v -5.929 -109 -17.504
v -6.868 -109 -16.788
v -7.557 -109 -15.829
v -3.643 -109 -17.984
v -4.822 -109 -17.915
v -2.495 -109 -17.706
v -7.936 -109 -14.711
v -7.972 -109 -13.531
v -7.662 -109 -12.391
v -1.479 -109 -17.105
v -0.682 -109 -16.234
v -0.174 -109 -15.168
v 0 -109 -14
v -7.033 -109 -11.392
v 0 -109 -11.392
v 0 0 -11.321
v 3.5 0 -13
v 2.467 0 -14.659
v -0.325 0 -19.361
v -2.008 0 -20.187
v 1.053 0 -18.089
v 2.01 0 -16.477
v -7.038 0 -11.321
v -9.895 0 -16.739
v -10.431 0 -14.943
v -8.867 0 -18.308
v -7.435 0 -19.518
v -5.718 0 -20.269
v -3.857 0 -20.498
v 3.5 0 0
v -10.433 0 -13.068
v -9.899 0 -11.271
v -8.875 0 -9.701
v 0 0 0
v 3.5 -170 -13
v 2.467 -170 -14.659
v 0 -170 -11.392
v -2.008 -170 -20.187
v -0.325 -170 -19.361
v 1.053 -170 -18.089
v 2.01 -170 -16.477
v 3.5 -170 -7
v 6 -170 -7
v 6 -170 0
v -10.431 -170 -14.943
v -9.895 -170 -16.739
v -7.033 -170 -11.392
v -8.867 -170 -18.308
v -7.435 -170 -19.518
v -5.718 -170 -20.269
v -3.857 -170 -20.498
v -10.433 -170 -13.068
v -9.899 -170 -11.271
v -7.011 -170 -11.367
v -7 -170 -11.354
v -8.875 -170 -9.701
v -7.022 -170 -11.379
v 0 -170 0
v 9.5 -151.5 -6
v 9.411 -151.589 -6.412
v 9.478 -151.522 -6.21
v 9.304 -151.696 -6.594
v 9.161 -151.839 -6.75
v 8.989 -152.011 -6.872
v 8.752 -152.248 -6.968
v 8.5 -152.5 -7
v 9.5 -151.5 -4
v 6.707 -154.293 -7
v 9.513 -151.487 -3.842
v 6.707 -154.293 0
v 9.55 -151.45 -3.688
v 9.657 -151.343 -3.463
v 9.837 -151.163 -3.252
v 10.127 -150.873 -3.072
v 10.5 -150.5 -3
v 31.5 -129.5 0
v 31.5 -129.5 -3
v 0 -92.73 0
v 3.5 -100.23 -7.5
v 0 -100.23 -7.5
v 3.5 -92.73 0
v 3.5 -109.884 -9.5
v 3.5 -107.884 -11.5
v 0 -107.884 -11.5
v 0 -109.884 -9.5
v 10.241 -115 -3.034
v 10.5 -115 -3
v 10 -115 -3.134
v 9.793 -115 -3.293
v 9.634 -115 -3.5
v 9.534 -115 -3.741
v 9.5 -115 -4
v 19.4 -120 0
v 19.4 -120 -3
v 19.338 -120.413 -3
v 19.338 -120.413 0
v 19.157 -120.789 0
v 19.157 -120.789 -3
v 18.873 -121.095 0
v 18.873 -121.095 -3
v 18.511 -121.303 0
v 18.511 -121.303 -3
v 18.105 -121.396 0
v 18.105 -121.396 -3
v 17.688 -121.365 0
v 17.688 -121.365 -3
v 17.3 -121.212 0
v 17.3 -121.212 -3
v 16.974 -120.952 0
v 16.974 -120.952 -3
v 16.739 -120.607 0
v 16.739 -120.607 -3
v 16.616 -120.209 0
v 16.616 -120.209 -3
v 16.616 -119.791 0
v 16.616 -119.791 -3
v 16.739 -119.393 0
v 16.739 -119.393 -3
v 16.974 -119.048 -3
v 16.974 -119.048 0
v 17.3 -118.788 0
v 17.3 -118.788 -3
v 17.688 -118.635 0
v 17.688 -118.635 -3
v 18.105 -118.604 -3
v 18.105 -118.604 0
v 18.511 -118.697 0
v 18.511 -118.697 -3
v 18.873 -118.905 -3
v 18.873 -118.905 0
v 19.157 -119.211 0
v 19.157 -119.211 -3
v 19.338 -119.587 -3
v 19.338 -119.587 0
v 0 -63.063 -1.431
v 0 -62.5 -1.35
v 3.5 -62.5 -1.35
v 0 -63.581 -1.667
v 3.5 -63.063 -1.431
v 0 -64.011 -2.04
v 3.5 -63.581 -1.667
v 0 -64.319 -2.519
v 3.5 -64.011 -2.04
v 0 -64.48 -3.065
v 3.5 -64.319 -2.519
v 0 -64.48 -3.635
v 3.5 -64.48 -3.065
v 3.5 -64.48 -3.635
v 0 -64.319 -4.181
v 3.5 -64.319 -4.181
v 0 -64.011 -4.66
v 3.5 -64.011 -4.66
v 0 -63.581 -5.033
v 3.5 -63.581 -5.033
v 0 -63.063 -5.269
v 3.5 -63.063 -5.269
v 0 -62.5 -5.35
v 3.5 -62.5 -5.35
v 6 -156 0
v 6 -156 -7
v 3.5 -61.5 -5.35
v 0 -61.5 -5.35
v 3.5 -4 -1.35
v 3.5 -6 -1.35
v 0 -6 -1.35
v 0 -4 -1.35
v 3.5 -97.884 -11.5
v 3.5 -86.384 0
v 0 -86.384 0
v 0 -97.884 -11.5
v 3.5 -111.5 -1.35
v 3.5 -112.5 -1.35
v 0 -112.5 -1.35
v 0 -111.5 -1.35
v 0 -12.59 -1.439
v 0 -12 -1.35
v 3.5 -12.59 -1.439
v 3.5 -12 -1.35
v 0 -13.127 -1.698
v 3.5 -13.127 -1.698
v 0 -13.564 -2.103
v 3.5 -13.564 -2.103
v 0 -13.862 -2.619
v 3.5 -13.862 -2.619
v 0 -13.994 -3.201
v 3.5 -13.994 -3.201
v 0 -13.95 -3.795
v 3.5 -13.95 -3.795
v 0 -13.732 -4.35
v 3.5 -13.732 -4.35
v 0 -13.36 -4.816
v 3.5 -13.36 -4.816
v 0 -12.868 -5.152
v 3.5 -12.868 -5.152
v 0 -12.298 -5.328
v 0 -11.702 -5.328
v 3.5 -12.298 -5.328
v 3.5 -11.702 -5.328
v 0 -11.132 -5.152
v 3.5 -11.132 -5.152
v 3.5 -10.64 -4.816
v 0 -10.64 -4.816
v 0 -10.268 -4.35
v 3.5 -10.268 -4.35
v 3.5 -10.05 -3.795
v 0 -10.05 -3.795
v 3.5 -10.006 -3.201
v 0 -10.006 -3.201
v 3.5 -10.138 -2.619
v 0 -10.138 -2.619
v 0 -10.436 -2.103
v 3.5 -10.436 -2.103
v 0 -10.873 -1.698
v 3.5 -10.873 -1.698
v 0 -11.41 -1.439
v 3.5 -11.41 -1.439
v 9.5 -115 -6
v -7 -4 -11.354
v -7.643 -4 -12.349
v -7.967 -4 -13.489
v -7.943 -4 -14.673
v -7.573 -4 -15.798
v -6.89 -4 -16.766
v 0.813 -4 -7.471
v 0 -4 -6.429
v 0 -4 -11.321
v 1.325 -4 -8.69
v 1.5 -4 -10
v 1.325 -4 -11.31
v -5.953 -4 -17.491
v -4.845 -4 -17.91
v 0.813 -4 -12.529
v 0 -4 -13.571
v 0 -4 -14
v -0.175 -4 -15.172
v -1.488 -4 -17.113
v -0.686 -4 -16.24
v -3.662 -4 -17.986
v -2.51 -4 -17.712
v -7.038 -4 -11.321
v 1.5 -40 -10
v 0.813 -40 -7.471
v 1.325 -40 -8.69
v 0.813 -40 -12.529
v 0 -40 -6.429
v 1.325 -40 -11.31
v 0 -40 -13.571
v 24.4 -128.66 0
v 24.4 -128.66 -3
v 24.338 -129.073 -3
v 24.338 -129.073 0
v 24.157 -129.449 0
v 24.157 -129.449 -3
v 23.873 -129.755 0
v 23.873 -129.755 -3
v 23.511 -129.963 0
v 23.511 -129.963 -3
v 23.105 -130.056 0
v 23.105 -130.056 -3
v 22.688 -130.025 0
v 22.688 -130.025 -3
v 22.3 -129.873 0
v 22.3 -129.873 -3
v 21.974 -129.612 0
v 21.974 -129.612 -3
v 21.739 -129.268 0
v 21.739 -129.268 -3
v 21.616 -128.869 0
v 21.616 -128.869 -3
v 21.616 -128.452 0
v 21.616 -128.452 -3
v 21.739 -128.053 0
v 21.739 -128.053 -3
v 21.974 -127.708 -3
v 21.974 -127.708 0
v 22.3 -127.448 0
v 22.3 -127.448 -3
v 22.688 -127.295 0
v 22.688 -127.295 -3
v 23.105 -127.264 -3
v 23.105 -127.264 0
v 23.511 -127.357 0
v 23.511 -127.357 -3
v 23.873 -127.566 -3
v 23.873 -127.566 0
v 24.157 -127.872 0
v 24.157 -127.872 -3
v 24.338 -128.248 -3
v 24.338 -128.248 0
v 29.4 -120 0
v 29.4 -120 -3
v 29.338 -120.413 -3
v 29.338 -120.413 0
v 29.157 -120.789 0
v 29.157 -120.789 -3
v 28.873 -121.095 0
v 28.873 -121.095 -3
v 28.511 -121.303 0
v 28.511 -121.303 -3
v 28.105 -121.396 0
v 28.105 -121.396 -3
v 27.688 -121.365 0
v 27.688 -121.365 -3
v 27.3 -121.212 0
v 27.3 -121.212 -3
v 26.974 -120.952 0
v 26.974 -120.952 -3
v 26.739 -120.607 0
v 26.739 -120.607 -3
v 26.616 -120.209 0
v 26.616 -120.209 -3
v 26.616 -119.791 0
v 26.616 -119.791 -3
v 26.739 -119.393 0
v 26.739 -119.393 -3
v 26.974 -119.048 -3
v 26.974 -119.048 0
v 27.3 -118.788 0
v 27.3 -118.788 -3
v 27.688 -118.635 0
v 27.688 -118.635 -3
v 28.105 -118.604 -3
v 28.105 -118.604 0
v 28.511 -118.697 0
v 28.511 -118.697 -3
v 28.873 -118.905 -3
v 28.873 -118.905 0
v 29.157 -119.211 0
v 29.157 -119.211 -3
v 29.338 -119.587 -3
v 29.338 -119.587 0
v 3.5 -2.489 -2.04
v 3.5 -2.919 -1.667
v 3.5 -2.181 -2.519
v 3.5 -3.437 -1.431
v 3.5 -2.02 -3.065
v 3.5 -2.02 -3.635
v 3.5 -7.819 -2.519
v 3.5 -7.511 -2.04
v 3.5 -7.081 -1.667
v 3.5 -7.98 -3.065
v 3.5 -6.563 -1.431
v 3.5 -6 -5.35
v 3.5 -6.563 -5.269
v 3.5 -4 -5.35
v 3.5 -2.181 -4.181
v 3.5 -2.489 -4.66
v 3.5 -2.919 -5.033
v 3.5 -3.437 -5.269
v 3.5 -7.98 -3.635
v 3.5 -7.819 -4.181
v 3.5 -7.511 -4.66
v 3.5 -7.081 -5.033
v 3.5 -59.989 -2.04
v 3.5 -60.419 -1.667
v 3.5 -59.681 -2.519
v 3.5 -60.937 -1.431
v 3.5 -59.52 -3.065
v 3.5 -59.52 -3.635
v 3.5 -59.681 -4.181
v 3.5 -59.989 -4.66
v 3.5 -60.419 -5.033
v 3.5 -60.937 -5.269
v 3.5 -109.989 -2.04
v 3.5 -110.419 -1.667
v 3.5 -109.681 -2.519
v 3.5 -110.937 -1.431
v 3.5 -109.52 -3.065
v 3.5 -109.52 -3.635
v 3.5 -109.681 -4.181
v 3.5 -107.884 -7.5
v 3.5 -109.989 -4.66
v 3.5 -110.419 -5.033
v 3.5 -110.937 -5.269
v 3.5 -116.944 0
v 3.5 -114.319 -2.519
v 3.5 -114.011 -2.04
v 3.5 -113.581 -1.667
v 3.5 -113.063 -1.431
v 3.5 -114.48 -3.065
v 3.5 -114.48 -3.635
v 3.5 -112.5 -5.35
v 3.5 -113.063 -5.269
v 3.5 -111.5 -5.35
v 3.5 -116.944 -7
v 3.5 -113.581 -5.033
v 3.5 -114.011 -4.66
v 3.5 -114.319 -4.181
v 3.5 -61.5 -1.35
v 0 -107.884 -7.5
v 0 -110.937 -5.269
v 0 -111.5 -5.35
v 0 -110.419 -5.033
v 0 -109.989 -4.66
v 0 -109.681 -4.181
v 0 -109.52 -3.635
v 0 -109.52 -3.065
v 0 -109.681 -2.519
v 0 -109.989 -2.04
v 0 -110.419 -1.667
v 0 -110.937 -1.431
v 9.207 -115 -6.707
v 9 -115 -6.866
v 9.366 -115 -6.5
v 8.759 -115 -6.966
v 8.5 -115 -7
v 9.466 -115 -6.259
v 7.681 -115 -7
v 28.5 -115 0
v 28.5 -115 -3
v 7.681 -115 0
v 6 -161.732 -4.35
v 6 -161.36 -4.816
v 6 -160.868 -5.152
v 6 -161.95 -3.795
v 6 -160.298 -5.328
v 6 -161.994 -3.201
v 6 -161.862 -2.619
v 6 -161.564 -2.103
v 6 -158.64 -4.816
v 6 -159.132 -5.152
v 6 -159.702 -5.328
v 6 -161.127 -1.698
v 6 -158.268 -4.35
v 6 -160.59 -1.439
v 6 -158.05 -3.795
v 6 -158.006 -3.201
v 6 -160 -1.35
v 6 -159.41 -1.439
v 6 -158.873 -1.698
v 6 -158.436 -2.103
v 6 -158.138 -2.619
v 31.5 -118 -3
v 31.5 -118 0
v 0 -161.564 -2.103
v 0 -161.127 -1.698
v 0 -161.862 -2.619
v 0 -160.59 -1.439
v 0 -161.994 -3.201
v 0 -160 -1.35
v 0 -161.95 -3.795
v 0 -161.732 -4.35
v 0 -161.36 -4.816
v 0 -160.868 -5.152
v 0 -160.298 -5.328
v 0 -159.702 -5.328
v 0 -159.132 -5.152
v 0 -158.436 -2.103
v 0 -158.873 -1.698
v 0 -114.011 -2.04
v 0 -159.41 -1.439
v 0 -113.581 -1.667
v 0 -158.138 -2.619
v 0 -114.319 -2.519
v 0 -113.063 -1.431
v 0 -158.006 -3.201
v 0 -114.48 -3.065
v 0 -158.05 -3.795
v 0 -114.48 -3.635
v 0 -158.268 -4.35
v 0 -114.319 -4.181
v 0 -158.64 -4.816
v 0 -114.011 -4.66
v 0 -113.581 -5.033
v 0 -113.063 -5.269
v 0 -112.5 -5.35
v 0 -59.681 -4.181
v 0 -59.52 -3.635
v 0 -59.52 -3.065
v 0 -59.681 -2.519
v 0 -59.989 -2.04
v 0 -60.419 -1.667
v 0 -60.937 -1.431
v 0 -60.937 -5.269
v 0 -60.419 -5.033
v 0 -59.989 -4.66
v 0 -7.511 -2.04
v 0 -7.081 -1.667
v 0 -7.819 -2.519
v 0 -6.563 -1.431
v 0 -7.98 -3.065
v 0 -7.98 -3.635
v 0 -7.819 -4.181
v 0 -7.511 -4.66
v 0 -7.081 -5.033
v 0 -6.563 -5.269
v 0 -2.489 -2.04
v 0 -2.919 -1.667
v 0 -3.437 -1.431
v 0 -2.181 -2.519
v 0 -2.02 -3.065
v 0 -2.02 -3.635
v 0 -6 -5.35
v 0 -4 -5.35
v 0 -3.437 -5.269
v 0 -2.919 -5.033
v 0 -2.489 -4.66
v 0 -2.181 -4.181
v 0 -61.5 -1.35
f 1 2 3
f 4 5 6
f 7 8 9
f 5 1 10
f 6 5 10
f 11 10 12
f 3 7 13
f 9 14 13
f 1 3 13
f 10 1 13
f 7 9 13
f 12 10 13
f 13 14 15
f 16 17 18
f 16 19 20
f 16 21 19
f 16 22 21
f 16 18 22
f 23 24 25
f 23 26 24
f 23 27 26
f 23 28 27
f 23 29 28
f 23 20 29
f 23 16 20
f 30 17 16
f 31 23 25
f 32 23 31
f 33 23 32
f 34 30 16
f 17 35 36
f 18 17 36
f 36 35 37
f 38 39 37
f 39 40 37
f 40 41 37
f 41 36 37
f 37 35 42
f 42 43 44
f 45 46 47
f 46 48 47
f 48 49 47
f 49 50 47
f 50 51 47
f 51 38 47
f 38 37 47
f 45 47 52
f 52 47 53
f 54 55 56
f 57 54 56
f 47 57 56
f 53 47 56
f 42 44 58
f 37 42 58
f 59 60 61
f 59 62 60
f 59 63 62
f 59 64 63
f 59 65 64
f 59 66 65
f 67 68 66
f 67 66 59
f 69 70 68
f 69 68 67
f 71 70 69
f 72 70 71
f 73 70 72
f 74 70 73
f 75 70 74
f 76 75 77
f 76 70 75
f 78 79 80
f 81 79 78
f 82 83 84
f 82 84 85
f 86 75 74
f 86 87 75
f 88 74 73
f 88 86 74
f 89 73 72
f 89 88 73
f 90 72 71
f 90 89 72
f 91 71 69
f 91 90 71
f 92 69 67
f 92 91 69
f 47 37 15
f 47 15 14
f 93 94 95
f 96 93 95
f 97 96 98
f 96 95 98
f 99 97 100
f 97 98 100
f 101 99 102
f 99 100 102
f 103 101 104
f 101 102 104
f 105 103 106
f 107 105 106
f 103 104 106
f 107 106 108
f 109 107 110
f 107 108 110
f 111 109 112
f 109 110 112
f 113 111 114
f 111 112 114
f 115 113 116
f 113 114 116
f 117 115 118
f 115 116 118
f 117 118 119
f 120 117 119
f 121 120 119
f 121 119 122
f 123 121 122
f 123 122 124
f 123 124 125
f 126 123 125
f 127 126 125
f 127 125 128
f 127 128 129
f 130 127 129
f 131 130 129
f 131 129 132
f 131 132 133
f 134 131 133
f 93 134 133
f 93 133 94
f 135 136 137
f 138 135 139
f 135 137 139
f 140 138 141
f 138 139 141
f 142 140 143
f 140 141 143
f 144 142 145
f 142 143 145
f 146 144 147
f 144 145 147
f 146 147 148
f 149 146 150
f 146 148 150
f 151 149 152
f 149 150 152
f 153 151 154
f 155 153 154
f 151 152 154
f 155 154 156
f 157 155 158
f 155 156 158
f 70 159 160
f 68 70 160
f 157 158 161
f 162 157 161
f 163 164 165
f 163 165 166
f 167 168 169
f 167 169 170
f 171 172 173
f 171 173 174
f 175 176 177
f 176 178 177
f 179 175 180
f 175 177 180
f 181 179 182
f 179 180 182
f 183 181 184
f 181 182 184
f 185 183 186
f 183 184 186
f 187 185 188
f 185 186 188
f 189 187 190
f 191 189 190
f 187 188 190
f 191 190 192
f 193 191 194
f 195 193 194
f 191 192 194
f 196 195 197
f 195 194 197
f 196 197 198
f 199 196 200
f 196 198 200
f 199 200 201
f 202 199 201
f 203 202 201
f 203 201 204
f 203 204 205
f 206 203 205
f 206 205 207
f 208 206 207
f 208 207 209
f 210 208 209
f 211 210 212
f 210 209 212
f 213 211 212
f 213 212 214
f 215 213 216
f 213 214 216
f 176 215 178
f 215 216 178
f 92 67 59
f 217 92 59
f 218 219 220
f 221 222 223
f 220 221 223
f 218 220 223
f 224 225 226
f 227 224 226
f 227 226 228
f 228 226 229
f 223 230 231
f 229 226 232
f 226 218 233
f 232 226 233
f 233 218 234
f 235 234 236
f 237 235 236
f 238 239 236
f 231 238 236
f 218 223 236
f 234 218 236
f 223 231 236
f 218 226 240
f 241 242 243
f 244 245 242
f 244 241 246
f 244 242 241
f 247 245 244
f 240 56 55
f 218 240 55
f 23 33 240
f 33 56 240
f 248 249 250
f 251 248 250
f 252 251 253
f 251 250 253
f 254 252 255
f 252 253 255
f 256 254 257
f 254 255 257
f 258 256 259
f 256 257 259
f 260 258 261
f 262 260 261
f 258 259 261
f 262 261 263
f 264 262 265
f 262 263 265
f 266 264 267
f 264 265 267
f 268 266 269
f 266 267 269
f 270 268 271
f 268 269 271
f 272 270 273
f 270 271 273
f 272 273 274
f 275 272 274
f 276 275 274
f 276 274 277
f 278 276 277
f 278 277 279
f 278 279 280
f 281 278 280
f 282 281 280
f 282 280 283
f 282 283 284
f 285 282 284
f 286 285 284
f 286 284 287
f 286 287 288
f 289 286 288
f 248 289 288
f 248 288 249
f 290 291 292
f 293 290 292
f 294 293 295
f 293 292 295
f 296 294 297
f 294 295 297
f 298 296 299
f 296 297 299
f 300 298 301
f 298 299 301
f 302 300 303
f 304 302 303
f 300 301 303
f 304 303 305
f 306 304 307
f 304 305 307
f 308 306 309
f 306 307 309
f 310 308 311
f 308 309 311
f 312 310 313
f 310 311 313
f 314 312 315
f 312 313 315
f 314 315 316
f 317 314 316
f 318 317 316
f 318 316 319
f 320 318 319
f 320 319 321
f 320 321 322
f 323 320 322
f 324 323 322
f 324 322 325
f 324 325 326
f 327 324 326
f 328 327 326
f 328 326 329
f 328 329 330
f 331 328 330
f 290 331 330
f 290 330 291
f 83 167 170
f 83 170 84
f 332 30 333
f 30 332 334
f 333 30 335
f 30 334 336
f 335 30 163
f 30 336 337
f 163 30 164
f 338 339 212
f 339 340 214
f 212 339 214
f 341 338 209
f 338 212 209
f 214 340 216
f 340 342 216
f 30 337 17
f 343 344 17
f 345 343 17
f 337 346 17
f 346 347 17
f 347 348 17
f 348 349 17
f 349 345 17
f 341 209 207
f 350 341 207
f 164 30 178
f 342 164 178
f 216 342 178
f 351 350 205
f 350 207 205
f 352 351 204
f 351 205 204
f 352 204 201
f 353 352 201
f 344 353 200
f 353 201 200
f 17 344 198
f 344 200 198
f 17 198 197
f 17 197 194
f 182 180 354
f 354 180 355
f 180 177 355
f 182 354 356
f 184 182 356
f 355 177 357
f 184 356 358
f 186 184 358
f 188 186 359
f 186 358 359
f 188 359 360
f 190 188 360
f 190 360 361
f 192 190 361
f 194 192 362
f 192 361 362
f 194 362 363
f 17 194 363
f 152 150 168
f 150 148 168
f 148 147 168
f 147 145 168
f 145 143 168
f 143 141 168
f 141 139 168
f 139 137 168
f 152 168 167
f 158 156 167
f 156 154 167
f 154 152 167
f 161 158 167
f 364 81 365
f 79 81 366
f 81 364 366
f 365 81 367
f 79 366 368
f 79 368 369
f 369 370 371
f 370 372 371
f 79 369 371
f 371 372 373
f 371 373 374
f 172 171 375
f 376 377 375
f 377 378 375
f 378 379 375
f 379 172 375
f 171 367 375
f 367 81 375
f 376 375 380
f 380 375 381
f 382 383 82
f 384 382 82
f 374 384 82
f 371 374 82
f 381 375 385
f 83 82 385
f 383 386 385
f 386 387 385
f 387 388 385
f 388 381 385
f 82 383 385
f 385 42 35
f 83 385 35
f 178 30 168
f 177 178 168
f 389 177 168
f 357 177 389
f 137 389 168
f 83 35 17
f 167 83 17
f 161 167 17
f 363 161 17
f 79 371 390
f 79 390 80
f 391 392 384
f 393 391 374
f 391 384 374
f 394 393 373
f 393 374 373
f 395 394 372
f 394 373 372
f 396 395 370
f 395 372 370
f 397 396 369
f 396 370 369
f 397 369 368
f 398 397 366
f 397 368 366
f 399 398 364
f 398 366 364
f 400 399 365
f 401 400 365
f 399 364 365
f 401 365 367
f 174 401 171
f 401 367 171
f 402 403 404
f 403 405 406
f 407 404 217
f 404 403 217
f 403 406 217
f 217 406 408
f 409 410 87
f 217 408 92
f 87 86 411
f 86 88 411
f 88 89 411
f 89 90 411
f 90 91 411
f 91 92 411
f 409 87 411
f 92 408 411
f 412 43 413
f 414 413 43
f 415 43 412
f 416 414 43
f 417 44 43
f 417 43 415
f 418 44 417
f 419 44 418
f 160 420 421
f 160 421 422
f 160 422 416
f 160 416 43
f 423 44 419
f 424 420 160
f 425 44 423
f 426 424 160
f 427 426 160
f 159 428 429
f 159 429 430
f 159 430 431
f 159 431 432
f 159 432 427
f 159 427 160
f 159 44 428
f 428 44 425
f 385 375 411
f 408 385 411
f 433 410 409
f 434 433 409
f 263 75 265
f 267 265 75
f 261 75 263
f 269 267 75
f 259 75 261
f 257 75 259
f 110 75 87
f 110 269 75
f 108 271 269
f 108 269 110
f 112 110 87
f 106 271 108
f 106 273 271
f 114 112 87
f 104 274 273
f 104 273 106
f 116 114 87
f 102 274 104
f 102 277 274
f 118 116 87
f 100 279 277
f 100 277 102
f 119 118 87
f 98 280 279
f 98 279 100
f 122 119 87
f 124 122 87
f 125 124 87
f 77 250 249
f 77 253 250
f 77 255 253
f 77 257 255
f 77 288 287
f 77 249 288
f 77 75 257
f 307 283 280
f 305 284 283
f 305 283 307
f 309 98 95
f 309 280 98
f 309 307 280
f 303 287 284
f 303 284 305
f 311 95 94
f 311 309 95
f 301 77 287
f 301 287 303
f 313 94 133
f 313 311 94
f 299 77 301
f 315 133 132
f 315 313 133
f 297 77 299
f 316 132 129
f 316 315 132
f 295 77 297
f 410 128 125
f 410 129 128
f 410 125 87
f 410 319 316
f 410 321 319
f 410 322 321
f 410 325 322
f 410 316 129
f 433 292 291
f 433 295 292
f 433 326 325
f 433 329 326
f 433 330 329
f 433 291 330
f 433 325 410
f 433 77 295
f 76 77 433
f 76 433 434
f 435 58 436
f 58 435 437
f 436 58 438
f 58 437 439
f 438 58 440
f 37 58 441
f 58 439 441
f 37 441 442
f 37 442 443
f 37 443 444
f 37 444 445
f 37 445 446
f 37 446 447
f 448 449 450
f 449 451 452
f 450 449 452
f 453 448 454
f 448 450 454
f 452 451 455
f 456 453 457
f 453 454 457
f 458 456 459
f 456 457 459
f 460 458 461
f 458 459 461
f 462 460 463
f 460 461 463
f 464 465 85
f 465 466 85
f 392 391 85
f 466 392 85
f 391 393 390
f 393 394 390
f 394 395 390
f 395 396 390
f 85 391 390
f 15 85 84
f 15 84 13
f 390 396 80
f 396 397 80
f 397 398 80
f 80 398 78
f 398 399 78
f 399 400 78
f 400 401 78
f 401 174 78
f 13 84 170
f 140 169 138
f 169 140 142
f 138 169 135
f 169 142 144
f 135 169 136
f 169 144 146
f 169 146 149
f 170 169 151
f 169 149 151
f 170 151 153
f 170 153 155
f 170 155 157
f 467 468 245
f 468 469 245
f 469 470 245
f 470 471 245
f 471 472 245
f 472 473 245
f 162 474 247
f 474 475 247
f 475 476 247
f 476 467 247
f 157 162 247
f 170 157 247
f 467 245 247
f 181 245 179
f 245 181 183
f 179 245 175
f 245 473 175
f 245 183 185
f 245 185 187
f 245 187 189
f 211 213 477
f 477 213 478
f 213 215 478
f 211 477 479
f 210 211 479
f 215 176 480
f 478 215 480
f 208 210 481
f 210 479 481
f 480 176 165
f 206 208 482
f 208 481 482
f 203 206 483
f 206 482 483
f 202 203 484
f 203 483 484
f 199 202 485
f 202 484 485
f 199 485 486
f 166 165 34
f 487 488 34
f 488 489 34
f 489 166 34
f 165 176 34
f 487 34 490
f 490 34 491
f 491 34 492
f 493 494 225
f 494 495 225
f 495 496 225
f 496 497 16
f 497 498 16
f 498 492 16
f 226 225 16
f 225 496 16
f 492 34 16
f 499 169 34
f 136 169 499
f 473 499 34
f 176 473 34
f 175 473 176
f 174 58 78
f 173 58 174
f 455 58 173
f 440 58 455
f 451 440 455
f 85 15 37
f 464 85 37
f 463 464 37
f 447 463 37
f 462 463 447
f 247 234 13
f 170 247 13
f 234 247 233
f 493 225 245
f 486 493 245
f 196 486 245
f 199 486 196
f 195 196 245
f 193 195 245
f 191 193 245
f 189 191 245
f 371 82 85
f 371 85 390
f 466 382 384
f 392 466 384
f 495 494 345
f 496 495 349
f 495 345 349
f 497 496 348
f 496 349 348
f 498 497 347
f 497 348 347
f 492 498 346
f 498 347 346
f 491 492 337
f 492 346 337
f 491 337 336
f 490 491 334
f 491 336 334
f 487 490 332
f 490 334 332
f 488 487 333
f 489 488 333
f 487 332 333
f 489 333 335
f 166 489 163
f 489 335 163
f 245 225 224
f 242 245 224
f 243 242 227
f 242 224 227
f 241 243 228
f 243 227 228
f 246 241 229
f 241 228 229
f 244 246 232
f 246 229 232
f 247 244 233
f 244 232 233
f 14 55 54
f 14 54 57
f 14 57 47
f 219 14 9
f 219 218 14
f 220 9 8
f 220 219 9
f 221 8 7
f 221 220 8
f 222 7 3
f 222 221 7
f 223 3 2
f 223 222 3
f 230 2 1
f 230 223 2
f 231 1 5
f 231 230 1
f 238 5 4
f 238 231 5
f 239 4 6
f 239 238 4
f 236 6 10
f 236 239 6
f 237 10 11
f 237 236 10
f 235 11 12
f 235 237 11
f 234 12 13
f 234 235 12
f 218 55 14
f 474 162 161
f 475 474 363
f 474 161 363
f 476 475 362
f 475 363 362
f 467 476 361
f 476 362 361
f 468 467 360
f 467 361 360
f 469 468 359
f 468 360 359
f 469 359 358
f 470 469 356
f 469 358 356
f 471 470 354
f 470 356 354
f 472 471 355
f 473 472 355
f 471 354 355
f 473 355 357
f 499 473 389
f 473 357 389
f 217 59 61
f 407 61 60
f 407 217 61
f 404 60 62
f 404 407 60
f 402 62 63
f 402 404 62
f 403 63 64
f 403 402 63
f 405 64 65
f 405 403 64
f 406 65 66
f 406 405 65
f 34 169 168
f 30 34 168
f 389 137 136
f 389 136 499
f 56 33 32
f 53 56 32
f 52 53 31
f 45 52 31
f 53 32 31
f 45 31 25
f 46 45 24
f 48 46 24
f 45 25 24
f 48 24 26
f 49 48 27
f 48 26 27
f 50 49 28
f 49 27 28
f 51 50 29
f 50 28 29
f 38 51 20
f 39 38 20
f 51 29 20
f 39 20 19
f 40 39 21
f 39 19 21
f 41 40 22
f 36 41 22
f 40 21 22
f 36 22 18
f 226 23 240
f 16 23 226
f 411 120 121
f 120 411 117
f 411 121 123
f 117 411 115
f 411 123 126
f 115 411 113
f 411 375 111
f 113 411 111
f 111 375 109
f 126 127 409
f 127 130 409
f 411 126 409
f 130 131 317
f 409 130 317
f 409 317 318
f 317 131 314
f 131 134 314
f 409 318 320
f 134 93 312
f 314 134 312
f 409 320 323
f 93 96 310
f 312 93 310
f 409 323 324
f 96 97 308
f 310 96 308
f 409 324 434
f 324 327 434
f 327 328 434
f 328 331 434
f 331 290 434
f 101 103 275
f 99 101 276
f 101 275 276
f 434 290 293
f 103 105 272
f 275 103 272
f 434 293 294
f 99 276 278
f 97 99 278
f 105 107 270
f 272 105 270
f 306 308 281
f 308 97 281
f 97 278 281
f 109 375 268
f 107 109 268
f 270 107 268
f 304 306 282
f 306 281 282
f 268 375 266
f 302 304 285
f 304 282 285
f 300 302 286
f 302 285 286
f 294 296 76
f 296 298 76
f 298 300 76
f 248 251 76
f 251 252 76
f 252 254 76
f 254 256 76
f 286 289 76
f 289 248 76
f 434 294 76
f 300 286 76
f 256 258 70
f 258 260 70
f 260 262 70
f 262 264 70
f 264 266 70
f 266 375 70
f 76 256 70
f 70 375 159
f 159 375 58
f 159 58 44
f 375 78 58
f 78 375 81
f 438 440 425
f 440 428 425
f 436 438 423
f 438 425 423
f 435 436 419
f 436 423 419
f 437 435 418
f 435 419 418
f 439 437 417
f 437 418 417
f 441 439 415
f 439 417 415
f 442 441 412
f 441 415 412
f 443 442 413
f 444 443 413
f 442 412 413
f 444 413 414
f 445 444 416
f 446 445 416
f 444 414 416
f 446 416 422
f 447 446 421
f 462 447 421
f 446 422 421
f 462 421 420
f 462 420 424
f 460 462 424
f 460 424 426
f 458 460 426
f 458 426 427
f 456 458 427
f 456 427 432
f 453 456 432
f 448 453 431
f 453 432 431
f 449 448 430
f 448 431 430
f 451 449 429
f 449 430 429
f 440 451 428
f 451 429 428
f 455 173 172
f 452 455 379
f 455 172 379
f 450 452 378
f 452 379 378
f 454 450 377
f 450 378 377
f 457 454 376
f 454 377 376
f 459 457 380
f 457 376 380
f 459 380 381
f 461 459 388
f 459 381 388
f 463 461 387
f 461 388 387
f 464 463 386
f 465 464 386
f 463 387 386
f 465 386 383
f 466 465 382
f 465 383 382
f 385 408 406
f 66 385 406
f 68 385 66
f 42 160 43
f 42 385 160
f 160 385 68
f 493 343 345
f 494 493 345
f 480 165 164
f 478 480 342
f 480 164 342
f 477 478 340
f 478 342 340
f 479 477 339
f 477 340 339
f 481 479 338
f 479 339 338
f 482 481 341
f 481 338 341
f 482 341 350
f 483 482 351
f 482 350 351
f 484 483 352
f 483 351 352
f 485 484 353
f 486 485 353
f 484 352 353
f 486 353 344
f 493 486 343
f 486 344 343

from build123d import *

# Parameters (mm, degrees)
PAD_DEPTH            = 170
PAD001_DEPTH         = 170
SKETCH003_W          = 7
SKETCH003_H          = 55
PAD002_DEPTH         = 29
POCKET_DEPTH         = 9
POCKET001_DEPTH      = 25
SKETCH005_R          = 1.4
POCKET002_DEPTH      = 7.001
SKETCH001_R          = 2
POCKET003_DEPTH      = 5
POCKET003_DEPTH_BACK = -100
POCKET004_DEPTH      = 40
PAD003_DEPTH         = 4
PAD004_DEPTH         = 61
POCKET005_DEPTH      = 5
POCKET005_DEPTH_BACK = -100
POCKET006_DEPTH      = 9
CHAMFER_SIZE         = 3
CHAMFER001_SIZE      = 1
FILLET_R             = 1
FILLET001_R          = 1


with BuildPart() as part:
    # Sketch → Pad (new body)
    with BuildSketch(Plane.XZ):
        with BuildLine():
            Line((0, 0), (2.5, 0))
            Line((2.5, 0), (2.5, -14))
            ThreePointArc((-8.875, -9.700654), (-6.298097, -20.080193), (2.5, -14))
            Line((-8.875, -9.700654), (-7, -11.354249))
            ThreePointArc((-7, -11.354249), (-5.414214, -17.741657), (0, -14))
            Line((0, 0), (0, -14))
        make_face()
    extrude(amount=PAD_DEPTH)

    # Sketch012 → Pad001 (join)
    with BuildSketch(Plane.XZ.offset(170)):
        Polygon((3.5, 0), (3.5, -13), (0.771706, -17.379086), (0.771706, 0), align=None)
    extrude(amount=-PAD001_DEPTH)

    # Sketch003 → Pad002 (join)
    with BuildSketch(Plane(origin=(2.5, 0, 0), x_dir=(0, 0, 1), z_dir=(1, 0, 0))):
        with Locations((-3.5, 142.5)):
            Rectangle(SKETCH003_W, SKETCH003_H)
    extrude(amount=PAD002_DEPTH)

    # Sketch008 → Pocket (cut)
    with BuildSketch(Plane(origin=(0, 0, 0), x_dir=(-1, 0, 0), z_dir=(0, 0, 1))):
        Polygon((-6, 171.390472), (-6, 155), (-43.587333, 117.412667), (-43.587333, 179.575119), align=None)
    extrude(amount=-POCKET_DEPTH, mode=Mode.SUBTRACT)

    # Sketch011 → Pocket001 (cut)
    with BuildSketch(Plane(origin=(34.5, 0, 0), x_dir=(0, 0, 1), z_dir=(1, 0, 0))):
        Polygon((-11.354396, 166.316992), (-3, 157.962596), (-3, 109.627052), (-19.434643, 110.990524), align=None)
    extrude(amount=-POCKET001_DEPTH, mode=Mode.SUBTRACT)

    # Sketch005 → Pocket002 (cut, through all)
    with BuildSketch(Plane(origin=(0, 0, -7), x_dir=(1, 0, 0), z_dir=(0, 0, -1))):
        with Locations((28, 120)):
            Circle(SKETCH005_R)
        with Locations((18, 120)):
            Circle(SKETCH005_R)
        with Locations((23, 128.660254)):
            Circle(SKETCH005_R)
    extrude(amount=-POCKET002_DEPTH, mode=Mode.SUBTRACT)

    # Sketch001 (on Face2 of Pad) → Pocket003 (cut, two sides)
    with BuildSketch(Plane(origin=(2.5, 0, 0), x_dir=(0, 0, 1), z_dir=(1, 0, 0))) as pocket003_sk:
        with Locations((-3.35, 12)):
            Circle(SKETCH001_R)
        with Locations((-3.35, 160)):
            Circle(SKETCH001_R)
        with BuildLine():
            ThreePointArc((-1.35, 6), (-3.35, 8), (-5.35, 6))
            Line((-5.35, 6), (-5.35, 4))
            ThreePointArc((-5.35, 4), (-3.35, 2), (-1.35, 4))
            Line((-1.35, 6), (-1.35, 4))
        make_face()
        with BuildLine():
            ThreePointArc((-1.35, 112.5), (-3.35, 114.5), (-5.35, 112.5))
            Line((-5.35, 112.5), (-5.35, 111.5))
            ThreePointArc((-5.35, 111.5), (-3.35, 109.5), (-1.35, 111.5))
            Line((-1.35, 112.5), (-1.35, 111.5))
        make_face()
        with BuildLine():
            ThreePointArc((-1.35, 62.5), (-3.35, 64.5), (-5.35, 62.5))
            Line((-5.35, 62.5), (-5.35, 61.5))
            ThreePointArc((-5.35, 61.5), (-3.35, 59.5), (-1.35, 61.5))
            Line((-1.35, 62.5), (-1.35, 61.5))
        make_face()
    extrude(amount=-POCKET003_DEPTH, mode=Mode.SUBTRACT)
    extrude(pocket003_sk.sketch, amount=-POCKET003_DEPTH_BACK, mode=Mode.SUBTRACT)

    # Sketch006 → Pocket004 (cut)
    with BuildSketch(Plane(origin=(0, 0, 0), x_dir=(1, 0, 0), z_dir=(0, 1, 0))):
        with BuildLine():
            ThreePointArc((-3.5, 5), (1.5, 10), (-3.5, 15))
            Line((-3.5, 15), (-3.5, 5))
        make_face()
    extrude(amount=-POCKET004_DEPTH, mode=Mode.SUBTRACT)

    # Sketch009 → Pad003 (join)
    with BuildSketch(Plane(origin=(0, 0, 0), x_dir=(1, 0, 0), z_dir=(0, 1, 0))):
        Polygon((-8.988888, 11.321152), (0, 11.321152), (0, 5.375637), (1.760757, 5.375637), (1.760757, 16.152864), (-3.184568, 19.176249), (-9.013494, 16.474098), align=None)
    extrude(amount=-PAD003_DEPTH)

    # Sketch010 → Pad004 (join)
    with BuildSketch(Plane.XZ.offset(170)):
        Polygon((1.607719, -11.392114), (-8.313037, -11.392114), (-9.514894, -14.319767), (-8.858657, -17.099121), (-6.117905, -19.22224), (-3.18414, -19.22224), (0.714678, -18.102777), (1.607719, -15.709445), align=None)
    extrude(amount=-PAD004_DEPTH)

    # Sketch004 → Pocket005 (cut, two sides)
    with BuildSketch(Plane(origin=(2.5, 0, 0), x_dir=(0, 0, 1), z_dir=(1, 0, 0))) as pocket005_sk:
        Polygon((-9.5, 109.884079), (-7.5, 107.884079), (-7.5, 100.23037), (1.897298, 90.833072), (4.794627, 81.589452), (-11.5, 97.884079), (-11.5, 107.884079), align=None)
    extrude(amount=-POCKET005_DEPTH, mode=Mode.SUBTRACT)
    extrude(pocket005_sk.sketch, amount=-POCKET005_DEPTH_BACK, mode=Mode.SUBTRACT)

    # Sketch013 (on Face63 of Pocket005) → Pocket006 (cut)
    with BuildSketch(Plane(origin=(0, 0, 0), x_dir=(-1, 0, 0), z_dir=(0, 0, 1))):
        Polygon((-3.5, 112.04879), (-3.5, 116.943748), (-13.285114, 112.394318), align=None)
    extrude(amount=-POCKET006_DEPTH, mode=Mode.SUBTRACT)

    # Chamfer
    chamfer_edges = [part.edges().sort_by_distance(p)[0] for p in [
        (31.5, -115, -1.5),
    ]]
    chamfer(chamfer_edges, length=CHAMFER_SIZE)

    # Chamfer001
    chamfer001_edges = [part.edges().sort_by_distance(p)[0] for p in [
        (6, -155, -3.5),
    ]]
    chamfer(chamfer001_edges, length=CHAMFER001_SIZE)

    # Fillet
    fillet_edges = [part.edges().sort_by_distance(p)[0] for p in [
        (9.5, -133.25, -3),
    ]]
    fillet(fillet_edges, radius=FILLET_R)

    # Fillet001
    fillet001_edges = [part.edges().sort_by_distance(p)[0] for p in [
        (9.5, -133.25, -7),
    ]]
    fillet(fillet001_edges, radius=FILLET001_R)


solid = part.part
